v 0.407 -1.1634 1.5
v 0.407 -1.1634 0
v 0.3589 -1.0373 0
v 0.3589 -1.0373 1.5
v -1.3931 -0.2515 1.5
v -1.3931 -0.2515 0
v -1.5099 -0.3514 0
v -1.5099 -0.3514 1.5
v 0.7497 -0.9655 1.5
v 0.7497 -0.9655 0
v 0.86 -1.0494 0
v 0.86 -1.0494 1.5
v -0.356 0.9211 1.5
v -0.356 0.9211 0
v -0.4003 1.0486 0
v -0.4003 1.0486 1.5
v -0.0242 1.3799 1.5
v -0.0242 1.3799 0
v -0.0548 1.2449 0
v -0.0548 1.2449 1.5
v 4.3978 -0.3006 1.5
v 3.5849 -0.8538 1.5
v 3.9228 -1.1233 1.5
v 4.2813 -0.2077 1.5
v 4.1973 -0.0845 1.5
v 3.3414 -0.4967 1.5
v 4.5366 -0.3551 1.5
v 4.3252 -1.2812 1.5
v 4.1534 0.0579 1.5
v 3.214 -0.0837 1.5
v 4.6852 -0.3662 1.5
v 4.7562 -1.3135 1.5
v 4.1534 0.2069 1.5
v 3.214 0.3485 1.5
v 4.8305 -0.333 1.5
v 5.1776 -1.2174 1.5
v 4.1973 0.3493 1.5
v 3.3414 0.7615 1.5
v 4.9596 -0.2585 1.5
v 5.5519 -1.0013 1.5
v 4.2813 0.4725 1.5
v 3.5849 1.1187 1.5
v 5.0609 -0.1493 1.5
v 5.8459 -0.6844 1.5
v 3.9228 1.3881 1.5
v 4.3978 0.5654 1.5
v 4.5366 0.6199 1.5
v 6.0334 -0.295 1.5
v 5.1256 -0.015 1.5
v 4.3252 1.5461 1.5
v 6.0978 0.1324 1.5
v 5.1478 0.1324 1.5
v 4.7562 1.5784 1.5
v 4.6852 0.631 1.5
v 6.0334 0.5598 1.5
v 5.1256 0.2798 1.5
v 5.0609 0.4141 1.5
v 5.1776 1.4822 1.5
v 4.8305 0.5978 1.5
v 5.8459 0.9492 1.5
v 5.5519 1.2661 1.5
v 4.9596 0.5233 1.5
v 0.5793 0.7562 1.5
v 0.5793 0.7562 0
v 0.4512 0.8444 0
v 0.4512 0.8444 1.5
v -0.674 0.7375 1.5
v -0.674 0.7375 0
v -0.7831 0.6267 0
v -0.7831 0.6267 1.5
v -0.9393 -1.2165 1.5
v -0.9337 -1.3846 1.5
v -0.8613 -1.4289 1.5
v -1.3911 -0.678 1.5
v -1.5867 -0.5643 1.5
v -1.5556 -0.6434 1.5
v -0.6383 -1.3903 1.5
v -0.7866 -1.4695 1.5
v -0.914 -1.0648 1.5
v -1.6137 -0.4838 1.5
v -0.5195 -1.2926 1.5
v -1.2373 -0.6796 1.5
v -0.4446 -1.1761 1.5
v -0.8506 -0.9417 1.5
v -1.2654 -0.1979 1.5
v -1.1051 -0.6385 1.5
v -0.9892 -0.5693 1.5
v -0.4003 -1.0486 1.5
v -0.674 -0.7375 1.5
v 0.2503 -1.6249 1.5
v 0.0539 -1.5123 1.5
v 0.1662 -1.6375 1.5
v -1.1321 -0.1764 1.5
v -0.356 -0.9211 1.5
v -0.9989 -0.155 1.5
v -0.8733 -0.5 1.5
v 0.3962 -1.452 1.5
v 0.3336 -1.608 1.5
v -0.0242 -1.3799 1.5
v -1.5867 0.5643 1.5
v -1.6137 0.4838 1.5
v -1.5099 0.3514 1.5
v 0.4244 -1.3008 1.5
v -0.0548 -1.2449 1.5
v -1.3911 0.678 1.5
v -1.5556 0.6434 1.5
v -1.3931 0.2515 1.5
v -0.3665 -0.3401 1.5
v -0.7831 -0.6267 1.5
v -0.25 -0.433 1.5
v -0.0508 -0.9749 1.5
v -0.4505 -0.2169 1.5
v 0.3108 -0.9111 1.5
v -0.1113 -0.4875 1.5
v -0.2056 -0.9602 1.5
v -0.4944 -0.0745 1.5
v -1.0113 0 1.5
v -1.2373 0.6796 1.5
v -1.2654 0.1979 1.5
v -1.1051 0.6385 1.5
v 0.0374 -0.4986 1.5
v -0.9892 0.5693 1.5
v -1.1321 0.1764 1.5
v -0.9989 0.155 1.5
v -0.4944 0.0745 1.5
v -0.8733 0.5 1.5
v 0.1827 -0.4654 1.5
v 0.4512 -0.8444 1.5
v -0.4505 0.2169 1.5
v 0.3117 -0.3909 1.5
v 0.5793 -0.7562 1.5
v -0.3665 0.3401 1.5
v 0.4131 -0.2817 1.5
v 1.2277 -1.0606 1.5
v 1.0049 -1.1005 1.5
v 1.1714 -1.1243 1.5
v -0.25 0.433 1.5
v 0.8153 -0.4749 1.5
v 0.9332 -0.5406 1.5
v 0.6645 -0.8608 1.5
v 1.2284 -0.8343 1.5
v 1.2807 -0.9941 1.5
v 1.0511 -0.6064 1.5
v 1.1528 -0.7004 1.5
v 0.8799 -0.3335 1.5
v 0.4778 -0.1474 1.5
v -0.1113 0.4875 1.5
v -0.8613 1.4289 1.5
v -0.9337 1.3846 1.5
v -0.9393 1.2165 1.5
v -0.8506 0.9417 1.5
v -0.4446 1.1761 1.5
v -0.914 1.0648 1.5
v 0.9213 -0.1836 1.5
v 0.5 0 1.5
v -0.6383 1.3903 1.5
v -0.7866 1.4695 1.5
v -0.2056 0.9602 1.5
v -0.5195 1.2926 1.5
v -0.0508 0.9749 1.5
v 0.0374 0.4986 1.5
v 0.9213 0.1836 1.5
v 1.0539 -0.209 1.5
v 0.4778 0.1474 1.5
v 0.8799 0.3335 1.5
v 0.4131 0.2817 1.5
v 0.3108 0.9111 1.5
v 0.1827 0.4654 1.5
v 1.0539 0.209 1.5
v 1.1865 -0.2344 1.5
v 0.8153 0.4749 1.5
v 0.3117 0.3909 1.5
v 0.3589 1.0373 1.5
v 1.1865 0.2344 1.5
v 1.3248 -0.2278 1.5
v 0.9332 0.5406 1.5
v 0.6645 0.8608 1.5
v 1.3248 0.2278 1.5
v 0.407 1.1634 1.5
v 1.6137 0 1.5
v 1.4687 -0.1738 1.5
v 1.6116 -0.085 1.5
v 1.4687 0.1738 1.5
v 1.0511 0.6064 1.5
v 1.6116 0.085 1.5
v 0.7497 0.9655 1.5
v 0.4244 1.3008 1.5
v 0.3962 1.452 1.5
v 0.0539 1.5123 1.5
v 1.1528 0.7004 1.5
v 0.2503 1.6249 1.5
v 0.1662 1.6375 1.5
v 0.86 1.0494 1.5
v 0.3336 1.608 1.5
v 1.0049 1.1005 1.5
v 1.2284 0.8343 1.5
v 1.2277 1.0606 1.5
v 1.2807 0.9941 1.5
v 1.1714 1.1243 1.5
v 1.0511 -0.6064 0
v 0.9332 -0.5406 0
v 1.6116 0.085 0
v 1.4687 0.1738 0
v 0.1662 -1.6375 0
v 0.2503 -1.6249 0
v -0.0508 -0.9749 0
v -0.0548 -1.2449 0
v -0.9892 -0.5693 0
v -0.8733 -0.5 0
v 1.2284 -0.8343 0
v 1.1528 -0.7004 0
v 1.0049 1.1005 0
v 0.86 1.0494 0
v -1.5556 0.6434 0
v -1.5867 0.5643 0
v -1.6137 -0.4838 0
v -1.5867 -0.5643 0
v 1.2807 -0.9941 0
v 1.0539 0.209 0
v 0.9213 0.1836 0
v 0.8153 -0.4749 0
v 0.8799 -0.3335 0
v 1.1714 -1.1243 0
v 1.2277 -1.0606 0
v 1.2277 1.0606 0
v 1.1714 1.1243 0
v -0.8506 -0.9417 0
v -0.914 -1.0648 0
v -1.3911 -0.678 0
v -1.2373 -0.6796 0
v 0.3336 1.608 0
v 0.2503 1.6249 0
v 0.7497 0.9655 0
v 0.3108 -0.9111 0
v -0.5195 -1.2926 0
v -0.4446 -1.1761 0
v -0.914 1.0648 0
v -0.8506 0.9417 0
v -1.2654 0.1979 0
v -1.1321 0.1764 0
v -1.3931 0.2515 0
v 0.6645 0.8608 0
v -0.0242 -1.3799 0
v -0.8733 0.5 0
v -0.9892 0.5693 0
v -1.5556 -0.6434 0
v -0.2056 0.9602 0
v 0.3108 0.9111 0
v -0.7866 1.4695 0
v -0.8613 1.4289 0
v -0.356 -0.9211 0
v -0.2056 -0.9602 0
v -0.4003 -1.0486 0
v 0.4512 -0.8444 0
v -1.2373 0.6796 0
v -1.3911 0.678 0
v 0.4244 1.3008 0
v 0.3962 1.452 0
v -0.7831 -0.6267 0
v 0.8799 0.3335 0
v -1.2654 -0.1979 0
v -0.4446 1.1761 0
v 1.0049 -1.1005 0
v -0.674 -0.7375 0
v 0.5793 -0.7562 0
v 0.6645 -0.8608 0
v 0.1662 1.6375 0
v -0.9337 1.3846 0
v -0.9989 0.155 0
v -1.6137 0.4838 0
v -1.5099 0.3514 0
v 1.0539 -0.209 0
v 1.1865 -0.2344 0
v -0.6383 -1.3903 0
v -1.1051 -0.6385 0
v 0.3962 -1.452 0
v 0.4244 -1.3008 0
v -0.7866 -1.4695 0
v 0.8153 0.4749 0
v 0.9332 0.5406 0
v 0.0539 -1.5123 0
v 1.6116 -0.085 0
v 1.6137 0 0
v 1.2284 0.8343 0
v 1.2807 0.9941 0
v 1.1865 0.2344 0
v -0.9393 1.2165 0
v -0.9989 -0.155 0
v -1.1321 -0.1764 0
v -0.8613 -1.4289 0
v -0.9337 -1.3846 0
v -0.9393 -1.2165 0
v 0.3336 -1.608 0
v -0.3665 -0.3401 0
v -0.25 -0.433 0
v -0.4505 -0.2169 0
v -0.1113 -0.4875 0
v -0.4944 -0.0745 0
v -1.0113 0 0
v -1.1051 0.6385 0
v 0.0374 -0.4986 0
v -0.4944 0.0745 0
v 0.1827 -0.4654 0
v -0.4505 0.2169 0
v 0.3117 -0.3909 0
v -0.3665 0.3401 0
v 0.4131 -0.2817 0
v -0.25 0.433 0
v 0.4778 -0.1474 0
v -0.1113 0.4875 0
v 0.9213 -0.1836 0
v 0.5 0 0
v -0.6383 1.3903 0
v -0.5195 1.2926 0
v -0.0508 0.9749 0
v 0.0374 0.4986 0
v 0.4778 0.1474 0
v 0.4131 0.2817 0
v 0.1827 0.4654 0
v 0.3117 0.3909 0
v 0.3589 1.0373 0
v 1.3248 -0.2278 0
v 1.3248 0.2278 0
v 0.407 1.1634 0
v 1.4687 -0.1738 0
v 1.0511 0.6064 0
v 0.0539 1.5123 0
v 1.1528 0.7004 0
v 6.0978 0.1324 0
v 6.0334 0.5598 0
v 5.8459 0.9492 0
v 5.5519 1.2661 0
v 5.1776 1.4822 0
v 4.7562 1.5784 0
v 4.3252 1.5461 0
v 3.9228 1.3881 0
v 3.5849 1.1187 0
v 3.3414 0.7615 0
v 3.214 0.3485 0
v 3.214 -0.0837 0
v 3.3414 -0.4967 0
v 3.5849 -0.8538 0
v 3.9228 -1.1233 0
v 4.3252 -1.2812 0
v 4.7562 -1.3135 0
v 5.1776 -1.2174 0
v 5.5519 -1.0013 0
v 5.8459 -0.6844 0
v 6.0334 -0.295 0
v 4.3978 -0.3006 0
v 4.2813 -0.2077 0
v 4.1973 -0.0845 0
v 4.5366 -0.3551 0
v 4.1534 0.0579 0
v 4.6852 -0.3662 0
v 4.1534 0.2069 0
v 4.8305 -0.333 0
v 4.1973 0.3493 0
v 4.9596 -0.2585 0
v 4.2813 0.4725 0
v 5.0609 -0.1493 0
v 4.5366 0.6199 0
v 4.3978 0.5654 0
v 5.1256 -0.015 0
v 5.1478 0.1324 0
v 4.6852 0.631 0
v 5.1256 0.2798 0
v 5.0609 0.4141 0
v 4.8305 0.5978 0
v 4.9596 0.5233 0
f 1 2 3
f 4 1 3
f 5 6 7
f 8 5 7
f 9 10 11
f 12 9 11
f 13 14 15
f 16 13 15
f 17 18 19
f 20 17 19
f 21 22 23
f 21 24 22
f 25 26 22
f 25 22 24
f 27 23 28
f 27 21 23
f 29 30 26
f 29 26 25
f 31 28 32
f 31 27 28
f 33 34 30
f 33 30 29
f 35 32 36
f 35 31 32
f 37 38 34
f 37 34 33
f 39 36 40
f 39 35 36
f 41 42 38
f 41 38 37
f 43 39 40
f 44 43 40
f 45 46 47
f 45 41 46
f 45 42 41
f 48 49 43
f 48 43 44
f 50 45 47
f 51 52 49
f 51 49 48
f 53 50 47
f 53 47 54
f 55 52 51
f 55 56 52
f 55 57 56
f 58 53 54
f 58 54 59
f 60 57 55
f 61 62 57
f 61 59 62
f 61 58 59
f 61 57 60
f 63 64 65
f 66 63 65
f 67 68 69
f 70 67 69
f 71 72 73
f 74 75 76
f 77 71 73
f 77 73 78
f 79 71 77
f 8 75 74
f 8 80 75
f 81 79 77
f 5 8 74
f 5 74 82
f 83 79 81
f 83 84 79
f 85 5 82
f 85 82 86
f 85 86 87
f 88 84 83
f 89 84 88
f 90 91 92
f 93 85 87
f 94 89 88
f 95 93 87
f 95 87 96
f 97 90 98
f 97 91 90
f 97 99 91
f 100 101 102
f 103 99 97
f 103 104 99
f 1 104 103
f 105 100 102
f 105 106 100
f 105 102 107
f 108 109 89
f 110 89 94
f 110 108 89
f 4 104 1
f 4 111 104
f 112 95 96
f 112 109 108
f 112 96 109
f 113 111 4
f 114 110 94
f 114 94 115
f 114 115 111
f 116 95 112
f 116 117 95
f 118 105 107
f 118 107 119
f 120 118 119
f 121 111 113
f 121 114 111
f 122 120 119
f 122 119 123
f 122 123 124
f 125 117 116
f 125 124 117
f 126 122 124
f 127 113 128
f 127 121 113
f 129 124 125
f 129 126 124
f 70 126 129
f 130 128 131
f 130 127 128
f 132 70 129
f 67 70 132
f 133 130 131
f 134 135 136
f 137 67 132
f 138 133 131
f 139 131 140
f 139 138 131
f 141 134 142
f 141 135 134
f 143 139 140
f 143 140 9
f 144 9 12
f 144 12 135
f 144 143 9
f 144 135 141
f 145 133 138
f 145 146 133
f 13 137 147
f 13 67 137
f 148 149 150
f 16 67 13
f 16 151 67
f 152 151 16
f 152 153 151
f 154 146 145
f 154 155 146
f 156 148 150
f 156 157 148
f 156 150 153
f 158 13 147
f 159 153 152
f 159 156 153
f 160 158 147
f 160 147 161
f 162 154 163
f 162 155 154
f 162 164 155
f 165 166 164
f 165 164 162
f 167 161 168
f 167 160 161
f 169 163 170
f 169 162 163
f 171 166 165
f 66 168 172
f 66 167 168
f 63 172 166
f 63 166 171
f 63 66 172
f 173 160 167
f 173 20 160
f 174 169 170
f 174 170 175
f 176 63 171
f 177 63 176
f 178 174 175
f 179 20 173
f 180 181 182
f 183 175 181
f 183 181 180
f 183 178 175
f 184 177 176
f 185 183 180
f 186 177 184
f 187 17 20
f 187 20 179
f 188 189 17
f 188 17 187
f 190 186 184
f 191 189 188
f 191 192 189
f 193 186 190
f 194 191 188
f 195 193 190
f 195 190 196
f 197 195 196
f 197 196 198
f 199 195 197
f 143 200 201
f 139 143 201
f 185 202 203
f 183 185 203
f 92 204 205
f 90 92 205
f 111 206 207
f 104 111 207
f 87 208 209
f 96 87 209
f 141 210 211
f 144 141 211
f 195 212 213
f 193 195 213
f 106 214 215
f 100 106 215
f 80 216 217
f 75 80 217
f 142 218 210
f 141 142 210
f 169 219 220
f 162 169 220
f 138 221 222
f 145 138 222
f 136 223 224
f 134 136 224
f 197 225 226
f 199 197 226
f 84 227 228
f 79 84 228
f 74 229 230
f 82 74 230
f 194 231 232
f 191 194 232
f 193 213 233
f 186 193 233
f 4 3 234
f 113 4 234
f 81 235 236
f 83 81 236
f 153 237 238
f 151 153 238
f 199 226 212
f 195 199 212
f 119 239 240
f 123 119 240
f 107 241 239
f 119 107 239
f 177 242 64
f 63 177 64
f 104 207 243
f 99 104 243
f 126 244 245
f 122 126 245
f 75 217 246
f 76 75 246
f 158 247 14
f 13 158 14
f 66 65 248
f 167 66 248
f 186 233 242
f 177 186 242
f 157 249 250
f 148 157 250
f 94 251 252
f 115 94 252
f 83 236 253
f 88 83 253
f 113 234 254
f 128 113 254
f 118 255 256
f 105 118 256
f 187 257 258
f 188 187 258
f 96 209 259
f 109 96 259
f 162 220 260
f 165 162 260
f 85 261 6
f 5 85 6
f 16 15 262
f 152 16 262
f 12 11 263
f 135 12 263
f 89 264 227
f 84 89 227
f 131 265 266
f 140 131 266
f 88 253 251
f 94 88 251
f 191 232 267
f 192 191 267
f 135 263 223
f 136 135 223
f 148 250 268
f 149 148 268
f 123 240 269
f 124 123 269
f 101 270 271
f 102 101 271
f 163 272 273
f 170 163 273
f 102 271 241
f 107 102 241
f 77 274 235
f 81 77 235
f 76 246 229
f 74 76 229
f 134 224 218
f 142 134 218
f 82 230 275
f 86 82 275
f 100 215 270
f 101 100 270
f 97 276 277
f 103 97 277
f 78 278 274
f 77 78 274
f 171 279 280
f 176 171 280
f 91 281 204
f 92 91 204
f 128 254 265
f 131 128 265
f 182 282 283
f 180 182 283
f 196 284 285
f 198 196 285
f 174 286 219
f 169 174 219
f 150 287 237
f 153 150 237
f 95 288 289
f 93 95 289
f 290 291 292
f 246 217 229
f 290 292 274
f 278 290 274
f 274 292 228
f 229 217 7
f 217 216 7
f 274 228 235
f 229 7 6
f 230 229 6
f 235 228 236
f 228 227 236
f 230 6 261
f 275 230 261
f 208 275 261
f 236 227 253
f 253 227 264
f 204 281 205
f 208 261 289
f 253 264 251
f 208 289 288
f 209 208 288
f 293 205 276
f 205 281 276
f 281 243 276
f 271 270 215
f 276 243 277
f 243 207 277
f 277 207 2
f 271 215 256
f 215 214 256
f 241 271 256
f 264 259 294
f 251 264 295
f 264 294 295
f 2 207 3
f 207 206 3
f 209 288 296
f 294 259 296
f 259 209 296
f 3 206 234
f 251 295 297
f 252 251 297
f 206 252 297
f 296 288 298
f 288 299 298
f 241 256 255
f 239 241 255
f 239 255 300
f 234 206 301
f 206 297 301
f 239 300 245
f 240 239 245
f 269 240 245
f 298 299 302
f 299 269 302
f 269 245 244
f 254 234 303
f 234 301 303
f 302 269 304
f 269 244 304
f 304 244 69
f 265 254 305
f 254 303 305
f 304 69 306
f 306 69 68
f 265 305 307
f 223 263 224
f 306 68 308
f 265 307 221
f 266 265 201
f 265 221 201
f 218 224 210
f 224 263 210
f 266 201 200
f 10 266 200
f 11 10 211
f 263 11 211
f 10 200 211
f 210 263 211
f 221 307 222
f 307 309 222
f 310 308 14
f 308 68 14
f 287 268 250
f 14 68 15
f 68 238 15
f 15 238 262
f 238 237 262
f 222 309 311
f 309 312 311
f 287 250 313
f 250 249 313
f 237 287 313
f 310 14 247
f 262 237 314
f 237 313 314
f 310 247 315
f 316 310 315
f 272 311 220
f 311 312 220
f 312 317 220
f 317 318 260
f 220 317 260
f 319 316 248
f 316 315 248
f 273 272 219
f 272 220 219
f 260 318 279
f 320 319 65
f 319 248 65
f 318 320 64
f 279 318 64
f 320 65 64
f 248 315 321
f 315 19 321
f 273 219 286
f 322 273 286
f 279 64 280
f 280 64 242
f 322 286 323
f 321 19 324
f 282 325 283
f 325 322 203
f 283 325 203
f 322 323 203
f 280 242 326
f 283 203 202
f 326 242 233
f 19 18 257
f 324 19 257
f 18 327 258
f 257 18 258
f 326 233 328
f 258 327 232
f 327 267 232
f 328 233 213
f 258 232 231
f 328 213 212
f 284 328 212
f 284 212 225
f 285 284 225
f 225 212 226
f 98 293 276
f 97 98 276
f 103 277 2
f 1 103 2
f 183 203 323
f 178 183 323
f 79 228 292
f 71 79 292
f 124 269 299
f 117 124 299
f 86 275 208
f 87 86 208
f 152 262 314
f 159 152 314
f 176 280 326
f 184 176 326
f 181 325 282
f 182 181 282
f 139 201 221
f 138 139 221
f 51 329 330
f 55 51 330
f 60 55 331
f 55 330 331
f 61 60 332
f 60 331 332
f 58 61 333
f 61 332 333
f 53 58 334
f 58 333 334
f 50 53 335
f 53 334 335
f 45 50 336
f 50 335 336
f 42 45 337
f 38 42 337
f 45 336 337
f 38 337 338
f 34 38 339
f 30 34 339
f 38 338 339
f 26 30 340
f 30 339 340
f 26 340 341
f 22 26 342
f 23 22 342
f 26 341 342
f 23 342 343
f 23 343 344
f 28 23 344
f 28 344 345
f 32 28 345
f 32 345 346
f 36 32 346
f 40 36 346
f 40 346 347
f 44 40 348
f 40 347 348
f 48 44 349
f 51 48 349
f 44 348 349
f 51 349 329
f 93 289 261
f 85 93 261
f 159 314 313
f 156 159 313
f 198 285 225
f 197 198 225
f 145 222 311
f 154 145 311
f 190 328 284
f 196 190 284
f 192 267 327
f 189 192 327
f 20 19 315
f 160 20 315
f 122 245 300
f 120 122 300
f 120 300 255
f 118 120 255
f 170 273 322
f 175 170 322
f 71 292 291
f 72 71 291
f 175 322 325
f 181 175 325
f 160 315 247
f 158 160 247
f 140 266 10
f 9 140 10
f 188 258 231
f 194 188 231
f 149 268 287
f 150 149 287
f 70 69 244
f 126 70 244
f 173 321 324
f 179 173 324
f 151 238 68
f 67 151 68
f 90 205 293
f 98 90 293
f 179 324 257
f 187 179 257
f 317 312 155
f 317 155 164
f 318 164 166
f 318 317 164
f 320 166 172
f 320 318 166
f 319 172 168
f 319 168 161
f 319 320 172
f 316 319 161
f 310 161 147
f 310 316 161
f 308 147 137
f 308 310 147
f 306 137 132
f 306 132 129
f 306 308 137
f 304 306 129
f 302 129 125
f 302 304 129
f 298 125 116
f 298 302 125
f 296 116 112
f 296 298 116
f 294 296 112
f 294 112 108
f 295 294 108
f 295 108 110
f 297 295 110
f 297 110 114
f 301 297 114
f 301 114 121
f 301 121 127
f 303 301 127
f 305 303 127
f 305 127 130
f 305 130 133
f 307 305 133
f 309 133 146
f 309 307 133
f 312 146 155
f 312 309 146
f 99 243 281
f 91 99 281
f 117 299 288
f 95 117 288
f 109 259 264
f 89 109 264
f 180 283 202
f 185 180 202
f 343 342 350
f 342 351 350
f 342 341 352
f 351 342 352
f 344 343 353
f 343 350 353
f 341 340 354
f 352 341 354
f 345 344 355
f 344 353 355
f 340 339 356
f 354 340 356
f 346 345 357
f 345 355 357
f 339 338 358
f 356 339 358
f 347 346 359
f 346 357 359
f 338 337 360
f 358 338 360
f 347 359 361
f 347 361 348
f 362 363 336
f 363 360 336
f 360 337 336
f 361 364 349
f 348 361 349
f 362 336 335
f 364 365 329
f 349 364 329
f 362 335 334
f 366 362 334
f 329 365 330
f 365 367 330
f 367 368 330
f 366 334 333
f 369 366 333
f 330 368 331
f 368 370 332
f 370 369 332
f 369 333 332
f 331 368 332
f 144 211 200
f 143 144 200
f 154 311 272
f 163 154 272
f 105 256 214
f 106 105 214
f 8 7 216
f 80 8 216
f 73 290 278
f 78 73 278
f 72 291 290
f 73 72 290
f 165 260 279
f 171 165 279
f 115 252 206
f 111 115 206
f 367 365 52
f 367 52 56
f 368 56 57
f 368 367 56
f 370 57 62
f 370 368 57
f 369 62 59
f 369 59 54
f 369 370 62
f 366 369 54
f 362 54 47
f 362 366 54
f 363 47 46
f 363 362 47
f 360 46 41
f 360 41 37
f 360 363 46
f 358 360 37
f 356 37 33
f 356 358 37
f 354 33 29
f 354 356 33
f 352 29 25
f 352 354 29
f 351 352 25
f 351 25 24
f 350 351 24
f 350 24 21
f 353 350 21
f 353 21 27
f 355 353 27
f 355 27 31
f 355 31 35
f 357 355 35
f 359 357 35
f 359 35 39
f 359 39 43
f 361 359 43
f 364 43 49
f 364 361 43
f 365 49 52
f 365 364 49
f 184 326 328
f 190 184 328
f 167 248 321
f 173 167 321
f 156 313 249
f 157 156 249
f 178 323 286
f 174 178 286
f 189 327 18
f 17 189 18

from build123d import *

# Parameters (mm, degrees)
F0_R     = 0.5
F1_DEPTH = 1.5
F2_R     = 1.45
F2_R_2   = 0.5
F3_DEPTH = 1.5


with BuildPart() as f1:
    # F0 (on Top) → F1 (new body)
    with BuildSketch(Plane.XY):
        Polygon((0.815294, -0.474861), (0.879947, -0.33347), (0.921305, -0.183599), (1.053889, -0.20902), (1.186474, -0.234441), (1.32482, -0.227775), (1.468747, -0.173784), (1.611558, -0.084957), (1.613747, 0), (1.611558, 0.084957), (1.468747, 0.173784), (1.32482, 0.227775), (1.186474, 0.234441), (1.053889, 0.20902), (0.921305, 0.183599), (0.879947, 0.33347), (0.815294, 0.474861), (0.9332, 0.540611), (1.051107, 0.606362), (1.1528, 0.700395), (1.22835, 0.834269), (1.280653, 0.994112), (1.22772, 1.0606), (1.171434, 1.124274), (1.004937, 1.100522), (0.859978, 1.049367), (0.749715, 0.965547), (0.664489, 0.860849), (0.579264, 0.756151), (0.451247, 0.844375), (0.310834, 0.911129), (0.358893, 1.037285), (0.406951, 1.163441), (0.42441, 1.300842), (0.396232, 1.451958), (0.333553, 1.608025), (0.250266, 1.624933), (0.16622, 1.63753), (0.053943, 1.512313), (-0.02422, 1.379948), (-0.054808, 1.244862), (-0.052796, 1.109877), (-0.050784, 0.974892), (-0.20556, 0.960188), (-0.356031, 0.921069), (-0.400308, 1.048601), (-0.444585, 1.176134), (-0.51953, 1.292611), (-0.638251, 1.39026), (-0.786584, 1.469525), (-0.861253, 1.428942), (-0.933734, 1.384568), (-0.939254, 1.216476), (-0.914048, 1.064836), (-0.850649, 0.941692), (-0.762341, 0.839581), (-0.674033, 0.73747), (-0.783146, 0.626718), (-0.873268, 0.50003), (-0.989163, 0.569265), (-1.105057, 0.6385), (-1.237339, 0.679553), (-1.391052, 0.678044), (-1.555632, 0.643418), (-1.586746, 0.564333), (-1.613746, 0.483751), (-1.509928, 0.351436), (-1.393147, 0.251475), (-1.265425, 0.197895), (-1.132141, 0.176436), (-0.998857, 0.154978), (-1.011253, 0), (-0.998857, -0.154978), (-1.132141, -0.176436), (-1.265425, -0.197895), (-1.393147, -0.251475), (-1.509928, -0.351436), (-1.613746, -0.483751), (-1.586746, -0.564333), (-1.555632, -0.643418), (-1.391052, -0.678044), (-1.237339, -0.679553), (-1.105057, -0.6385), (-0.989163, -0.569265), (-0.873268, -0.50003), (-0.783146, -0.626718), (-0.674033, -0.73747), (-0.762341, -0.839581), (-0.850649, -0.941692), (-0.914048, -1.064836), (-0.939254, -1.216476), (-0.933734, -1.384568), (-0.861253, -1.428942), (-0.786584, -1.469525), (-0.638251, -1.39026), (-0.51953, -1.292611), (-0.444585, -1.176134), (-0.400308, -1.048601), (-0.356031, -0.921069), (-0.20556, -0.960188), (-0.050784, -0.974892), (-0.052796, -1.109877), (-0.054808, -1.244862), (-0.02422, -1.379948), (0.053943, -1.512313), (0.16622, -1.63753), (0.250266, -1.624933), (0.333553, -1.608025), (0.396232, -1.451958), (0.42441, -1.300842), (0.406951, -1.163441), (0.358893, -1.037285), (0.310834, -0.911129), (0.451247, -0.844375), (0.579264, -0.756151), (0.664489, -0.860849), (0.749715, -0.965547), (0.859978, -1.049367), (1.004937, -1.100522), (1.171434, -1.124274), (1.22772, -1.0606), (1.280653, -0.994112), (1.22835, -0.834269), (1.1528, -0.700395), (1.051107, -0.606362), (0.9332, -0.540611), align=None)
        Circle(F0_R, mode=Mode.SUBTRACT)
    extrude(amount=F1_DEPTH)


with BuildPart() as f3:
    # F2 (on Top) → F3 (new body)
    with BuildSketch(Plane.XY):
        with Locations((4.647823, 0.132405)):
            Circle(F2_R)
        with Locations((4.647823, 0.132405)):
            Circle(F2_R_2, mode=Mode.SUBTRACT)
    extrude(amount=F3_DEPTH)


solid = Compound([f1.part, f3.part])
